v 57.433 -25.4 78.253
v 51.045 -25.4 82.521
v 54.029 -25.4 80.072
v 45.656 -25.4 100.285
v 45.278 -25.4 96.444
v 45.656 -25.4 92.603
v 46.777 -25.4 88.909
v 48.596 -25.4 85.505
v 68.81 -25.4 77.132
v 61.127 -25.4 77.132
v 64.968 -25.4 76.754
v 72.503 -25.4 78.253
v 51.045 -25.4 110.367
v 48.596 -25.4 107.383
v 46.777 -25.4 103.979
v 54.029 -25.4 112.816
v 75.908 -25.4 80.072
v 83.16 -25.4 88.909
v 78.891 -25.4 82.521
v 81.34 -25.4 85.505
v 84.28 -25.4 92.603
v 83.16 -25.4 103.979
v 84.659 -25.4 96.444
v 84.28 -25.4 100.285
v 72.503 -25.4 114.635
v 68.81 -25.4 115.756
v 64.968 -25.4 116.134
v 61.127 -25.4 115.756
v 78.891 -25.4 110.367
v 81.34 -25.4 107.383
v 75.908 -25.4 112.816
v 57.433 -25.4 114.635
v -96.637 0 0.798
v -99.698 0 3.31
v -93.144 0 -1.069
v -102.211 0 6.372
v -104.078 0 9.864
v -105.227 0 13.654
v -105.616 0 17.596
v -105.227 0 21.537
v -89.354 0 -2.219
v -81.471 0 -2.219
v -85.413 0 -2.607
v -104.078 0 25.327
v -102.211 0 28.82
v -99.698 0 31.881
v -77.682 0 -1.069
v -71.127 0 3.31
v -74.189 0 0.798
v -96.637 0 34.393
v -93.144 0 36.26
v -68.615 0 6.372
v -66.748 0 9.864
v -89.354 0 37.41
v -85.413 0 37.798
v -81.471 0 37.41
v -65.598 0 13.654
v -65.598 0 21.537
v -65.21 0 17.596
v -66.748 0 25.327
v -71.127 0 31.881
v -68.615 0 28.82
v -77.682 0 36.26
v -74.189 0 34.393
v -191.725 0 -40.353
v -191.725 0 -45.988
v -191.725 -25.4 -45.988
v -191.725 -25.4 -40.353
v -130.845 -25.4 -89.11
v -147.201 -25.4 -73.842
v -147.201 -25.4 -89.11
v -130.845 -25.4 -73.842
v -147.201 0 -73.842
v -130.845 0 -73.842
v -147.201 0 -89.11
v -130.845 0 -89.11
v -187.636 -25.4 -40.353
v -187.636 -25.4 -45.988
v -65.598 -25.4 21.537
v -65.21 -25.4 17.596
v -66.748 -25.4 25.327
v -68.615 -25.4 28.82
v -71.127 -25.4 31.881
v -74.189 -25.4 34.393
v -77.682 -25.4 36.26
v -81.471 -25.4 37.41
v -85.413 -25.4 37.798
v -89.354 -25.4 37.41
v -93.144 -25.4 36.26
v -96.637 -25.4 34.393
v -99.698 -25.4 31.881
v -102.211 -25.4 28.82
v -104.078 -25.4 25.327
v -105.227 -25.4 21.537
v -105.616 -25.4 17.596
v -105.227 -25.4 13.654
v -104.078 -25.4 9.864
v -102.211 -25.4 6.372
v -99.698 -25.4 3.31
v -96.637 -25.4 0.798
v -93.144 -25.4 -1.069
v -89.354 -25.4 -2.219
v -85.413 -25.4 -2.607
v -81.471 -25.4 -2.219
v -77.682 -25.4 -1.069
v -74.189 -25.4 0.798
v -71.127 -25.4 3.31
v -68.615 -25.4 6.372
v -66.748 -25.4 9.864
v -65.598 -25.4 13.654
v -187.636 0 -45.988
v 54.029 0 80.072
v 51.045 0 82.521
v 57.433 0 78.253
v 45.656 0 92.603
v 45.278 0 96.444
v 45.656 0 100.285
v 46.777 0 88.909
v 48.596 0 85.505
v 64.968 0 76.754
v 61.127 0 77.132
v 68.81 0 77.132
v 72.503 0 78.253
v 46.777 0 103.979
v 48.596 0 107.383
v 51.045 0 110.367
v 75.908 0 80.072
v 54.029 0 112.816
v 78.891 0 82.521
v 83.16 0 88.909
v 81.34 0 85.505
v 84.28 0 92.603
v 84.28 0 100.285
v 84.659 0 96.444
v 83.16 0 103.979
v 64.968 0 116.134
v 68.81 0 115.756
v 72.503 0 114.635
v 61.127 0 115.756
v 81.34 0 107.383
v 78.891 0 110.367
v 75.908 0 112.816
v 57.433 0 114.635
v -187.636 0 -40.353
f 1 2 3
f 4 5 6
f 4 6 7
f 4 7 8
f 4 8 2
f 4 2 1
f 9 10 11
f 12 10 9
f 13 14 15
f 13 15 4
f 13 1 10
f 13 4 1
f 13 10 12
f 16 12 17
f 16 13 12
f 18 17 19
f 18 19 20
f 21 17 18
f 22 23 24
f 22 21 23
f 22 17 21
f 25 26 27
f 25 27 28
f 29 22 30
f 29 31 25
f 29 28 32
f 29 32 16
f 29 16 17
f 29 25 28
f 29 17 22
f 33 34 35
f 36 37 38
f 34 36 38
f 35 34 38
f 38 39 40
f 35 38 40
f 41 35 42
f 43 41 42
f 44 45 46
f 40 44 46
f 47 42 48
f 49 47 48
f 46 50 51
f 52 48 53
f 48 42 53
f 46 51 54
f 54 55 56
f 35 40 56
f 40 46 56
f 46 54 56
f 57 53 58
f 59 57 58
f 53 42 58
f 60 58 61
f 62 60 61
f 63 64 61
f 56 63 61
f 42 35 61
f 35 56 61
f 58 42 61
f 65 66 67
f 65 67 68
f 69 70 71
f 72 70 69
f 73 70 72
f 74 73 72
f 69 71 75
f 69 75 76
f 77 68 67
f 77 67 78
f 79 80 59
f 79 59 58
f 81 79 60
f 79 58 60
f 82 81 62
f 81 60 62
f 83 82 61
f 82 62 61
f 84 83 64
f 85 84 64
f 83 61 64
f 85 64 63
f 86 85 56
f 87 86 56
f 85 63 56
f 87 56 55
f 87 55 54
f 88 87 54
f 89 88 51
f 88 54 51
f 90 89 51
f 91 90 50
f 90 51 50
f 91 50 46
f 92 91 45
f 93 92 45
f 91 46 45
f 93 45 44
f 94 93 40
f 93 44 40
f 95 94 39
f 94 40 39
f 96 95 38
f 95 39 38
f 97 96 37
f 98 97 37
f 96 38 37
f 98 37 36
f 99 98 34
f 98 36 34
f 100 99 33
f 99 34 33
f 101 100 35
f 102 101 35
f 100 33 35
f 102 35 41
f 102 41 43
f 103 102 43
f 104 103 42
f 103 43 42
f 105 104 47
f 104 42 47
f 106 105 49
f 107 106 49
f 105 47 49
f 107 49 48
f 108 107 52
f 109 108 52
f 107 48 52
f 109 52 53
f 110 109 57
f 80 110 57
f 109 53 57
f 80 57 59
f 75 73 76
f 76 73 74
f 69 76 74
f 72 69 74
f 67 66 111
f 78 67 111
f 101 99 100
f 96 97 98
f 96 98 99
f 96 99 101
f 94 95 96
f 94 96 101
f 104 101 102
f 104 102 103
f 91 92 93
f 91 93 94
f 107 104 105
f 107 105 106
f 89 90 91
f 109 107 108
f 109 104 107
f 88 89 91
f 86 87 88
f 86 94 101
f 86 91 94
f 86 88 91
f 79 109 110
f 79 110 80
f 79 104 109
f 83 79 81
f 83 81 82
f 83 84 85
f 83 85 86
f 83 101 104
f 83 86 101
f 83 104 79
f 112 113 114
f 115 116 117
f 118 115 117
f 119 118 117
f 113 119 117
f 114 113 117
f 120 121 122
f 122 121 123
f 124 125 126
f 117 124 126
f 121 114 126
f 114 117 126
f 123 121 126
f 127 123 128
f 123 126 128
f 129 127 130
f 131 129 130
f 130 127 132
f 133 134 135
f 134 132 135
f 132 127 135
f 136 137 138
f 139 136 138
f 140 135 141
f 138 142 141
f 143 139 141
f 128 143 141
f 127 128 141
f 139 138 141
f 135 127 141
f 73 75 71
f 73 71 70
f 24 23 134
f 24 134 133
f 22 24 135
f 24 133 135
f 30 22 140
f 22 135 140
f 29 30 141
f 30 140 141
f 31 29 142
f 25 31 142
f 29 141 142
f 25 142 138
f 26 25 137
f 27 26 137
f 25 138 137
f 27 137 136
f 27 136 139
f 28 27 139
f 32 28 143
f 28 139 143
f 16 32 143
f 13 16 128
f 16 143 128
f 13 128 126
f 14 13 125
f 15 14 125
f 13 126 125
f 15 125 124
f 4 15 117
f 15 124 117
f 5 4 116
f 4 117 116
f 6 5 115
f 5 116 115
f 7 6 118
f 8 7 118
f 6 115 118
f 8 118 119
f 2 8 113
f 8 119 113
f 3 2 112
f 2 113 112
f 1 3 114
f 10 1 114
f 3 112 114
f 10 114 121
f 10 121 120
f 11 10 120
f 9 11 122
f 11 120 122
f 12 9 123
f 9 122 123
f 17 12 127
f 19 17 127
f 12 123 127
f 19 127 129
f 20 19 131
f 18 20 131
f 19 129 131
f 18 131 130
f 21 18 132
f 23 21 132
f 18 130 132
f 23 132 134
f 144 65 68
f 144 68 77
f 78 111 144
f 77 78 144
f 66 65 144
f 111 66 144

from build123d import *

# Parameters (mm, degrees)
F0_W     = 4.088908
F0_H     = 5.634487
F0_W_2   = 16.355649
F0_H_2   = 15.268765
F0_R     = 20.202694
F0_R_2   = 19.690245
F1_DEPTH = 25.4


with BuildPart() as f1:
    # F0 (on Front) → F1 (new body)
    with BuildSketch(Plane.XZ):
        with Locations((-189.680055, -43.170669)):
            Rectangle(F0_W, F0_H)
        with Locations((-139.022984, -81.475924)):
            Rectangle(F0_W_2, F0_H_2)
        with Locations((-85.412815, 17.595531)):
            Circle(F0_R)
        with Locations((64.968258, 96.444033)):
            Circle(F0_R_2)
    extrude(amount=F1_DEPTH)


solid = f1.part
